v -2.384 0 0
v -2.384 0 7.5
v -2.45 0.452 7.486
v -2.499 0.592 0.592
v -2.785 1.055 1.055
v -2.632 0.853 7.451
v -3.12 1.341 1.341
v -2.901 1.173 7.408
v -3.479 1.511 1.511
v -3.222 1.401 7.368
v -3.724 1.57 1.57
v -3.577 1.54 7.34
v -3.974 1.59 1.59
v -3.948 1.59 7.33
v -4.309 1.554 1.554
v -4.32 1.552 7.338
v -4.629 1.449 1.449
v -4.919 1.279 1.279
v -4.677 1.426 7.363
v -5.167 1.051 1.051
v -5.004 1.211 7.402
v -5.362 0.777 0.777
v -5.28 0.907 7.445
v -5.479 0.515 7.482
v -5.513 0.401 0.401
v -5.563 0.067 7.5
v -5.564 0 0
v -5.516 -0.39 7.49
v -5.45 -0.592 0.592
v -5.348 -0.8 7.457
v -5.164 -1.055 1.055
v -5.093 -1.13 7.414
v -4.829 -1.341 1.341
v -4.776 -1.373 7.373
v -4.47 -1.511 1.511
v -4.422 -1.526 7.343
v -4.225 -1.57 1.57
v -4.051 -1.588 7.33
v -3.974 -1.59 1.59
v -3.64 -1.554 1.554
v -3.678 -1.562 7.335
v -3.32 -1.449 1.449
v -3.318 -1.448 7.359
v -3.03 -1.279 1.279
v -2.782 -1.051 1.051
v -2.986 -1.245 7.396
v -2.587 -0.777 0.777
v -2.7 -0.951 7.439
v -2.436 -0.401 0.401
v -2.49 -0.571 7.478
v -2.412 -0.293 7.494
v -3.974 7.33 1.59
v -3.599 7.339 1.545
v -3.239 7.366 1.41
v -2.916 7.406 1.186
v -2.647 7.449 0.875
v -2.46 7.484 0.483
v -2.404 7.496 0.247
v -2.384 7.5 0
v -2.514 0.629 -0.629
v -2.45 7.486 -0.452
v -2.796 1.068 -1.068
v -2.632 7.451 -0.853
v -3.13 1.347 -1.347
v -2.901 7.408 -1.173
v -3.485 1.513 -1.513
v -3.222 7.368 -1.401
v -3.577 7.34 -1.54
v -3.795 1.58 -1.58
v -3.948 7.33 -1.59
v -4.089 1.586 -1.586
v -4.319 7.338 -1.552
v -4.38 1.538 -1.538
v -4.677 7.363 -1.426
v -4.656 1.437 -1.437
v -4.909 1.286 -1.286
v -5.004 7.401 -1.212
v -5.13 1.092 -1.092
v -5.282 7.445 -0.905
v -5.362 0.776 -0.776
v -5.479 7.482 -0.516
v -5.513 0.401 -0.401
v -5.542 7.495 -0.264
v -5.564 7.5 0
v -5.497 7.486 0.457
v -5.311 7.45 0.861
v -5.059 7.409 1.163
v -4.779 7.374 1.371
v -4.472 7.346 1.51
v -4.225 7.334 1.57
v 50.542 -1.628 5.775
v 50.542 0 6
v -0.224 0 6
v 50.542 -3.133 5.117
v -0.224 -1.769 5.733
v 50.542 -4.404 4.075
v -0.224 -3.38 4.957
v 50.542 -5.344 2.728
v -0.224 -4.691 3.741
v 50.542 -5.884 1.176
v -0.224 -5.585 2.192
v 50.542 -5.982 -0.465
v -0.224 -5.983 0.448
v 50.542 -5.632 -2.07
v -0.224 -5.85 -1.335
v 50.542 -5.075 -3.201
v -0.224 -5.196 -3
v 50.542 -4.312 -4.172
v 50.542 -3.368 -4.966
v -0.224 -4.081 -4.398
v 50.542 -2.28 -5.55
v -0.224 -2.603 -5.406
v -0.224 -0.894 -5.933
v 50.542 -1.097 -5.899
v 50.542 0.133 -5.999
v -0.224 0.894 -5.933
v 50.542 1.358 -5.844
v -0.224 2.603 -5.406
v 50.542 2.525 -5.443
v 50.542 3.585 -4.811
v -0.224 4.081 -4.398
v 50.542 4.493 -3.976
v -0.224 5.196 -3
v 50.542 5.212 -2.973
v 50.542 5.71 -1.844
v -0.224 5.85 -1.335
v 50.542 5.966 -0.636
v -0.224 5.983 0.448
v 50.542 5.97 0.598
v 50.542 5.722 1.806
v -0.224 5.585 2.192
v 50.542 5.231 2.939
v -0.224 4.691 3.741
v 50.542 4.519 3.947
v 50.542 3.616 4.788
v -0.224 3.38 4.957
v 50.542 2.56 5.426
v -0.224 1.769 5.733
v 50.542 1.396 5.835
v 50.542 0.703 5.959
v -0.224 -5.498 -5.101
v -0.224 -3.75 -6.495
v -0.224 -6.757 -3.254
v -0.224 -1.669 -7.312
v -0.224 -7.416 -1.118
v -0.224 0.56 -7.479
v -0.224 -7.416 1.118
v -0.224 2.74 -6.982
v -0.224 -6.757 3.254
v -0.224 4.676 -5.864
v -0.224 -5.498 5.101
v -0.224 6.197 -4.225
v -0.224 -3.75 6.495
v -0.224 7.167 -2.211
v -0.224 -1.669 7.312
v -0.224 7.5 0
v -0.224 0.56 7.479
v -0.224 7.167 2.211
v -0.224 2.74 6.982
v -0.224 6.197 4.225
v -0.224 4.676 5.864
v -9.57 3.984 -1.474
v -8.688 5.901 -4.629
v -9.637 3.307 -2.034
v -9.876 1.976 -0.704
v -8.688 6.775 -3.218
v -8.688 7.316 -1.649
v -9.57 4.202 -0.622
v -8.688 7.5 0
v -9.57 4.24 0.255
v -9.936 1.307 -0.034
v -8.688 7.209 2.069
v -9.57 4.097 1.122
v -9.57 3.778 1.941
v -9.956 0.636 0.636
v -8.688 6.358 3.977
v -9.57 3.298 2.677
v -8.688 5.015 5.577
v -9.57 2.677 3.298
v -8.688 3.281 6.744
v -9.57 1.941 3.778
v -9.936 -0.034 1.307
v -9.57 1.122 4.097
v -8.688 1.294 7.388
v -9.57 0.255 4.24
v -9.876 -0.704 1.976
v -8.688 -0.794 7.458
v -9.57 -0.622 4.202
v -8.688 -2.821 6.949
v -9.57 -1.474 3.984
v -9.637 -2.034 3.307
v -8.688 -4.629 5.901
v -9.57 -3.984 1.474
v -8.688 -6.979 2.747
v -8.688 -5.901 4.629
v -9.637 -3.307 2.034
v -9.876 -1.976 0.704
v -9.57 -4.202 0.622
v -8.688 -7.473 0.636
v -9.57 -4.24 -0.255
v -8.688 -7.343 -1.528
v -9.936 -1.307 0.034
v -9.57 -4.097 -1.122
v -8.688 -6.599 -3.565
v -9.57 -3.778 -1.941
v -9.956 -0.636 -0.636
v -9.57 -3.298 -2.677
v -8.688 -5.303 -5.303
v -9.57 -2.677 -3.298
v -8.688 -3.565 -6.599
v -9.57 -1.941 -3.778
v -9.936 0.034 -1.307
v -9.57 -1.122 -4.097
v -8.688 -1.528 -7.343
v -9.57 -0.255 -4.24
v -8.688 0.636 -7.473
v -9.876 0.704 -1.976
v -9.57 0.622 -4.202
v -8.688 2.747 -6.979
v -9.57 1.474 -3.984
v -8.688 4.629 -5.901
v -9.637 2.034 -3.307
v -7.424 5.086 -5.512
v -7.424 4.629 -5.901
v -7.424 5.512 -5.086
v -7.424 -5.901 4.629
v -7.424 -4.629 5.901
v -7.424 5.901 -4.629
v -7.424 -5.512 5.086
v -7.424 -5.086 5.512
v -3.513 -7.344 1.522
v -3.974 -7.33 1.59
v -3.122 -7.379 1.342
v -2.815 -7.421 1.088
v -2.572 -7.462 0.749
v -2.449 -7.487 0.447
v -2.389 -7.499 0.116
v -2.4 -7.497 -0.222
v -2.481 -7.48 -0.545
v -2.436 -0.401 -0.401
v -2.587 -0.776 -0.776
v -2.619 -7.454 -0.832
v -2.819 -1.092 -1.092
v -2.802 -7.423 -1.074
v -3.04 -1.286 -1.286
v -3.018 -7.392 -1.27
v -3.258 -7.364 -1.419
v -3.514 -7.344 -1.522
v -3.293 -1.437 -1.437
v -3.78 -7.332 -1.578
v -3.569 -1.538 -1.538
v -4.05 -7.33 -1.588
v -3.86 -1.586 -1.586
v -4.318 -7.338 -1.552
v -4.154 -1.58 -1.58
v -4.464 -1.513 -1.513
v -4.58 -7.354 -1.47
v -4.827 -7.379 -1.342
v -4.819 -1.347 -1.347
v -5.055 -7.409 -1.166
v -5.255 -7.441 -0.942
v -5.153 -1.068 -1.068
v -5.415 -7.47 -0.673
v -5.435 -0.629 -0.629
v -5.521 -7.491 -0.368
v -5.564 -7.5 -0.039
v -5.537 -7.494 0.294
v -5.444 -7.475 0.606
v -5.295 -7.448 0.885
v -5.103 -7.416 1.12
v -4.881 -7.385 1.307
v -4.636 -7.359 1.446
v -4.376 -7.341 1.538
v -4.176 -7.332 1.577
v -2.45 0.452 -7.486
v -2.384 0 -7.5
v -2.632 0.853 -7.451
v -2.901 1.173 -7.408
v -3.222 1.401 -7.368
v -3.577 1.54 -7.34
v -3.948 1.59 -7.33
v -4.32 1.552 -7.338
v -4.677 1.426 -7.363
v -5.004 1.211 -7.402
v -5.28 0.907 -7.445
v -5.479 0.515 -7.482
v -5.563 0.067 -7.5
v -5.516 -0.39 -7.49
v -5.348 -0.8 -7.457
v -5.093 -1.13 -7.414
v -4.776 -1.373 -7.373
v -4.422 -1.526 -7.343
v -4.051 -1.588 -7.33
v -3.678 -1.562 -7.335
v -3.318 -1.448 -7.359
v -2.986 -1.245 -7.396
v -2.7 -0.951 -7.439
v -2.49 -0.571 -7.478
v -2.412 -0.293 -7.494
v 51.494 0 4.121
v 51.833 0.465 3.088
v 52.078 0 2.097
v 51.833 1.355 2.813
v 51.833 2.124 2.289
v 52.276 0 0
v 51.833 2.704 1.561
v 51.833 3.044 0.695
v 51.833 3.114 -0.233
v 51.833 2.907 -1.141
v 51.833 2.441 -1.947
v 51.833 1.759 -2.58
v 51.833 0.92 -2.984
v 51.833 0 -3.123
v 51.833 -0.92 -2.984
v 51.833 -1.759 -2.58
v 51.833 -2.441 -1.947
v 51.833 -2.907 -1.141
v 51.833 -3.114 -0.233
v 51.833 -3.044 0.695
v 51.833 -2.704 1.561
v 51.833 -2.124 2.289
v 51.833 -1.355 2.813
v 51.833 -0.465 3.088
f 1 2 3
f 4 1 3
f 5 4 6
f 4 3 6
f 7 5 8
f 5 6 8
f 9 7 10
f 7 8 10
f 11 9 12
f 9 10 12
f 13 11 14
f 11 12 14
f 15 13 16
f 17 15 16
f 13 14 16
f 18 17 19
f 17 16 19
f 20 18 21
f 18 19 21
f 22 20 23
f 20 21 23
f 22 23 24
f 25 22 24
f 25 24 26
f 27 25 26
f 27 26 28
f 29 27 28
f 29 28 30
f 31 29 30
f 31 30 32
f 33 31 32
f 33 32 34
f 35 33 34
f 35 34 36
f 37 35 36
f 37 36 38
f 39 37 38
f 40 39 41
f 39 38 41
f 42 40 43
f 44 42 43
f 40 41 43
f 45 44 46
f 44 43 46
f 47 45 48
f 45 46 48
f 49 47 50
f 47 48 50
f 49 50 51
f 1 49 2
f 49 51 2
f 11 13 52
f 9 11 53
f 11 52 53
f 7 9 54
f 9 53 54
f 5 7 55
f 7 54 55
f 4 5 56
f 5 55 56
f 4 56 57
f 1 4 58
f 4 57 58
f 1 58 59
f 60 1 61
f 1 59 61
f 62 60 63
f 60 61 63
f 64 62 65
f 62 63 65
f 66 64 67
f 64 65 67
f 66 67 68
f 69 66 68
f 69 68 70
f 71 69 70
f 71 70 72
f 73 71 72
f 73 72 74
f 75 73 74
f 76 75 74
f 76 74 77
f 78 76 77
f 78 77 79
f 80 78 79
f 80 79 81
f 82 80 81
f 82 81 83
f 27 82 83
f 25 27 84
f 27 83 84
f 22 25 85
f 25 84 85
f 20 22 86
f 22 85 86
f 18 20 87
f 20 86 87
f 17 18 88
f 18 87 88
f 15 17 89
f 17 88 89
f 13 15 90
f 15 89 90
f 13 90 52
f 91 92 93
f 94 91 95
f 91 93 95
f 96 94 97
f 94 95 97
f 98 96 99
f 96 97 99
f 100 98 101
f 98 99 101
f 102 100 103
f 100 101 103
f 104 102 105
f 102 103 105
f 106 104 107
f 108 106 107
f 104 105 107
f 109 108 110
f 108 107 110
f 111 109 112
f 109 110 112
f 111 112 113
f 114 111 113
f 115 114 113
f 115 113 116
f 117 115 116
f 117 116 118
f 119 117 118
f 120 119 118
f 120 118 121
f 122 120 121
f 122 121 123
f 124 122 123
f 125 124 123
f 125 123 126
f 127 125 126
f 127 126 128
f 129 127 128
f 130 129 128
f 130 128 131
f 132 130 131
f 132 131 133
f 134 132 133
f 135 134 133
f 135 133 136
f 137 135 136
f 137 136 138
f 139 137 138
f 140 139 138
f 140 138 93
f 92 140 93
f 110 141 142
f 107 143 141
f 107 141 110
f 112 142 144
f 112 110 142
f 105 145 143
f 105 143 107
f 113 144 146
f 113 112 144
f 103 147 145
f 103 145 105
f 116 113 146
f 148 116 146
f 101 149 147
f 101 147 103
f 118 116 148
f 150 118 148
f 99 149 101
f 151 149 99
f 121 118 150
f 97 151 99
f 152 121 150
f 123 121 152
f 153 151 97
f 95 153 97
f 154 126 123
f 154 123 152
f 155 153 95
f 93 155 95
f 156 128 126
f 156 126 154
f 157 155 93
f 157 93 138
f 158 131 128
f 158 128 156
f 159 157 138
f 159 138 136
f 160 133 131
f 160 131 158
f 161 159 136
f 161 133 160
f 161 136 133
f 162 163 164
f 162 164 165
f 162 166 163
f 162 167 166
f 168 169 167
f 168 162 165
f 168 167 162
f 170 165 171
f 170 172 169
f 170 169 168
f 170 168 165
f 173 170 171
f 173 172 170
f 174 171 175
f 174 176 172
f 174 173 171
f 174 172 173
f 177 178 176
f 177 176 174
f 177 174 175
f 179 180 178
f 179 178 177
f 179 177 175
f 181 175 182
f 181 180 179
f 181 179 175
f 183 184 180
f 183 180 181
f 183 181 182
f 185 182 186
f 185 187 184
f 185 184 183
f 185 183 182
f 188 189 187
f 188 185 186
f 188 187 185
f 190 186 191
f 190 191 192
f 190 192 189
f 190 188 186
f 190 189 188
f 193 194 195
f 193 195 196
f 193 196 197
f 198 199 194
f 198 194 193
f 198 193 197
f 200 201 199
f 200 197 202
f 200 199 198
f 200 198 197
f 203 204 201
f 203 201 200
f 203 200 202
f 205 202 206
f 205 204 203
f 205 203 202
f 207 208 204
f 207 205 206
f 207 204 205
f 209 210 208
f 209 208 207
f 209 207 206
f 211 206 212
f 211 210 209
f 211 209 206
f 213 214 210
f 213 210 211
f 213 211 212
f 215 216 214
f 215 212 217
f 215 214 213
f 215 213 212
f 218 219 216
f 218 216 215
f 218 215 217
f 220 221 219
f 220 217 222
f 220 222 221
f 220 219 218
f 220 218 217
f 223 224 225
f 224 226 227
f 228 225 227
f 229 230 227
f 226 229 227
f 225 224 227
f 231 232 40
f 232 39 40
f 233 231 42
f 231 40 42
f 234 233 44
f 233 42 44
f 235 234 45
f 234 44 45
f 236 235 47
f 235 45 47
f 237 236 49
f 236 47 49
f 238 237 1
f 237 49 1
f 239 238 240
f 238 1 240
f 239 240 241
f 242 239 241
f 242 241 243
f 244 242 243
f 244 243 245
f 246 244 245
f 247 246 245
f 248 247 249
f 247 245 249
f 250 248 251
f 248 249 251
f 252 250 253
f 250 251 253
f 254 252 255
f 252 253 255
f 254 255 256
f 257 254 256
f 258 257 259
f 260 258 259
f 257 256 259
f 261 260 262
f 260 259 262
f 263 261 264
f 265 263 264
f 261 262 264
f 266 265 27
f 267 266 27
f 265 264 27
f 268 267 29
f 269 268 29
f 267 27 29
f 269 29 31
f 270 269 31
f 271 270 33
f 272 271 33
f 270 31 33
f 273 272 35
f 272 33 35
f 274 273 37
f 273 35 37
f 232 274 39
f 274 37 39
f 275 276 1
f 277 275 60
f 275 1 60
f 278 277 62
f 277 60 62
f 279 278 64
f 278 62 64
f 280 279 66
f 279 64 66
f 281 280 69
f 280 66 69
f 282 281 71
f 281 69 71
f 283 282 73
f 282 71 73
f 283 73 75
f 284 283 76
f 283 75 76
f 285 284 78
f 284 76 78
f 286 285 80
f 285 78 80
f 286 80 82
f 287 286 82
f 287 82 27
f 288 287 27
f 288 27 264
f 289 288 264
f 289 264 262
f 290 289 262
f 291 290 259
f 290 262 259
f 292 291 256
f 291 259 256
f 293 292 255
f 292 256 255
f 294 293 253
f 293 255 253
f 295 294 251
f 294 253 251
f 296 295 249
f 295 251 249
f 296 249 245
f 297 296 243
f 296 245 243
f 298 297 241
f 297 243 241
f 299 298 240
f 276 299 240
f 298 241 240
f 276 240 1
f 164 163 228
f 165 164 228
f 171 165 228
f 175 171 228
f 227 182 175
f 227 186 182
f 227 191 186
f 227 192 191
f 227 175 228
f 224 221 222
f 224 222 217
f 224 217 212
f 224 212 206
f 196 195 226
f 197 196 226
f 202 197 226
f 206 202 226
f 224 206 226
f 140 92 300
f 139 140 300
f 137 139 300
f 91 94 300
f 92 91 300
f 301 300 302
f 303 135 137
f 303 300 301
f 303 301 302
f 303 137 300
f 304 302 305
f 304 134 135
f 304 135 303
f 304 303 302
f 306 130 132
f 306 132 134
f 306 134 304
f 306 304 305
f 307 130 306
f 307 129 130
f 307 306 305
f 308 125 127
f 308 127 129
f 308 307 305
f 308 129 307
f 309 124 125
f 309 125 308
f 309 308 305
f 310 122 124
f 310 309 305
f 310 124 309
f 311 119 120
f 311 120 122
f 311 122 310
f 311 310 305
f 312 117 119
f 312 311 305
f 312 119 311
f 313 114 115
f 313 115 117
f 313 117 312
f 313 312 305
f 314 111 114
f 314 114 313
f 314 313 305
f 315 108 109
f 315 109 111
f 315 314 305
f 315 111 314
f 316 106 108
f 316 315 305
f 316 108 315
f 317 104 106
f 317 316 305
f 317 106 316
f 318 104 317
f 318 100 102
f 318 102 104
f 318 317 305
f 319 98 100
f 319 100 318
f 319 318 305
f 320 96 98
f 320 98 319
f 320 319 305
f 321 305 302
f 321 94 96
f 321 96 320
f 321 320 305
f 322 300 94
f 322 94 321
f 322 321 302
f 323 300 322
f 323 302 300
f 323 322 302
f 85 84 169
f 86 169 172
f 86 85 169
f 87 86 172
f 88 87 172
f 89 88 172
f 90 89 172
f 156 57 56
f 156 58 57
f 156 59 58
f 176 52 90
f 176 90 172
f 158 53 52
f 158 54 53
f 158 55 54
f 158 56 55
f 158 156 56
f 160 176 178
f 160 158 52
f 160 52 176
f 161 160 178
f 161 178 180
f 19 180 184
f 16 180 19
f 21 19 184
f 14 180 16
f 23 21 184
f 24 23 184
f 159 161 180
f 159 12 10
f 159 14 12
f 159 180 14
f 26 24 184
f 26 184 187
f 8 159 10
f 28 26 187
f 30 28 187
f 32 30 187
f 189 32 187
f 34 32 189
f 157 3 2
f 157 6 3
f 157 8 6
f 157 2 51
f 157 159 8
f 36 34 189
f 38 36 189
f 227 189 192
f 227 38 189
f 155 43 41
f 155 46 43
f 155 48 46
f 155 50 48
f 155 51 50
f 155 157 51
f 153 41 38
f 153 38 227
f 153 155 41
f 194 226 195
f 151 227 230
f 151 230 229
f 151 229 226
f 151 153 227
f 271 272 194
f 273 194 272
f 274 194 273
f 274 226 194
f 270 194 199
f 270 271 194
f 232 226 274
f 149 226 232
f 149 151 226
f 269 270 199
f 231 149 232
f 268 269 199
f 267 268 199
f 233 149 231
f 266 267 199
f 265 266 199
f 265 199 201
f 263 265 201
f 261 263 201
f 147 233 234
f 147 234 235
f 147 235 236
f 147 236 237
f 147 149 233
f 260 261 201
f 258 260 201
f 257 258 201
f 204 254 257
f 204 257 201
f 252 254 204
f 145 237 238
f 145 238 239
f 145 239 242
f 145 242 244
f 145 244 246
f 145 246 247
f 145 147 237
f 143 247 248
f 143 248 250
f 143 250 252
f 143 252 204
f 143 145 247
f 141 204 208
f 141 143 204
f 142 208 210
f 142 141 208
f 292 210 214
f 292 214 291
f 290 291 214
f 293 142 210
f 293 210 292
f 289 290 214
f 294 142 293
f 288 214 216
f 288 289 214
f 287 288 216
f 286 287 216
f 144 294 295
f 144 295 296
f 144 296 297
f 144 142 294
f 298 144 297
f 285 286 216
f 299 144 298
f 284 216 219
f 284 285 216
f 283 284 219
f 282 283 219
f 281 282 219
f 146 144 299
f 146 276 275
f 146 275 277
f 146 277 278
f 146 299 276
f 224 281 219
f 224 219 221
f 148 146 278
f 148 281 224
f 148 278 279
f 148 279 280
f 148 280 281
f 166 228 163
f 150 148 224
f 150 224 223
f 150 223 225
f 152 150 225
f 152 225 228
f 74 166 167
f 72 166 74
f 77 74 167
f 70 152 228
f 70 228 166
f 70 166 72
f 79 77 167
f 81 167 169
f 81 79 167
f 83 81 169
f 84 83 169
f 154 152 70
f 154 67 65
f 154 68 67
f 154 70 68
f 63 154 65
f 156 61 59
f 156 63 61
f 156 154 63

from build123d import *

# Parameters (mm, degrees)
SKETCH2_R          = 4
NECK_DEPTH         = 35
SKETCH5_R          = 1.06
CUT_EXTRUDE1_DEPTH = 70
SKETCH6_R          = 1.06
CUT_EXTRUDE2_DEPTH = 70
SKETCH7_W          = 1.7
SKETCH7_H          = 1.2
CUT_EXTRUDE3_DEPTH = 70
SCALE_1_SCALE      = 1.5


with BuildPart() as part:
    # Sketch1 → BaseHead (revolve)
    with BuildSketch(Plane.XY):
        with BuildLine():
            Line((0.857864376, 5), (6.5, 5))
            Line((6.5, 5), (6.5, 0))
            Line((6.5, 0), (0, 0))
            ThreePointArc((0, 0), (0.216021605, 2.536529681), (0.857864376, 5))
        make_face()
    revolve(axis=Axis((-25.059543495, 0, 0), (1, 0, 0)))

    # Sketch2 → Neck (add)
    with BuildSketch(Plane(origin=(6.5, 3.614329884, 0.195577912), x_dir=(0, 0, -1), z_dir=(1, 0, 0))):
        with Locations(Location((0.195577912, -3.614329884, 0), (0, 0, 180))):
            Circle(SKETCH2_R)
    extrude(amount=NECK_DEPTH)

    # Sketch4 → Cut-Revolve1 (revolve, cut)
    with BuildSketch(Plane.XY, mode=Mode.PRIVATE) as cut_revolve1_sk:
        with BuildLine():
            Line((34, 7.5), (34, 12.5))
            Line((34, 12.5), (46.5, 12.5))
            Line((46.5, 12.5), (46.5, 0))
            Line((46.5, 0), (41.5, 0))
            ThreePointArc((41.5, 0), (39.303300859, 5.303300859), (34, 7.5))
        make_face()
    revolve(cut_revolve1_sk.sketch.rotate(Axis((61.414233577, 0, 0), (-1, 0, 0)), 270), axis=Axis((61.414233577, 0, 0), (-1, 0, 0)), mode=Mode.SUBTRACT)

    # Sketch5 → Cut-Extrude1 (cut, symmetric)
    with BuildSketch(Plane.XY):
        with Locations((4, 0)):
            Circle(SKETCH5_R)
    extrude(amount=CUT_EXTRUDE1_DEPTH, both=True, mode=Mode.SUBTRACT)

    # Sketch6 → Cut-Extrude2 (cut, symmetric)
    with BuildSketch(Plane(origin=(0, 0, 0), x_dir=(1, 0, 0), z_dir=(0, 1, 0))):
        with Locations(Location((4, 0, 0), (0, 0, 270))):
            Circle(SKETCH6_R)
    extrude(amount=CUT_EXTRUDE2_DEPTH, both=True, mode=Mode.SUBTRACT)

    # Sketch7 → Cut-Extrude3 (cut, symmetric)
    with BuildSketch(Plane(origin=(0, 0, 0), x_dir=(1, 0, 0), z_dir=(0, -0.7071067811865488, 0.7071067811865462))):
        with Locations((0.85, 0)):
            Rectangle(SKETCH7_W, SKETCH7_H)
    extrude(amount=CUT_EXTRUDE3_DEPTH, both=True, mode=Mode.SUBTRACT)


with BuildPart() as part_1:
    # 缩放比例1: scaled about (19.948892128, -3.087e-06, -4.178e-06)
    add(part.part.scale(SCALE_1_SCALE).moved(Location((-9.974446064, 1.543e-06, 2.089e-06))))


solid = part_1.part
